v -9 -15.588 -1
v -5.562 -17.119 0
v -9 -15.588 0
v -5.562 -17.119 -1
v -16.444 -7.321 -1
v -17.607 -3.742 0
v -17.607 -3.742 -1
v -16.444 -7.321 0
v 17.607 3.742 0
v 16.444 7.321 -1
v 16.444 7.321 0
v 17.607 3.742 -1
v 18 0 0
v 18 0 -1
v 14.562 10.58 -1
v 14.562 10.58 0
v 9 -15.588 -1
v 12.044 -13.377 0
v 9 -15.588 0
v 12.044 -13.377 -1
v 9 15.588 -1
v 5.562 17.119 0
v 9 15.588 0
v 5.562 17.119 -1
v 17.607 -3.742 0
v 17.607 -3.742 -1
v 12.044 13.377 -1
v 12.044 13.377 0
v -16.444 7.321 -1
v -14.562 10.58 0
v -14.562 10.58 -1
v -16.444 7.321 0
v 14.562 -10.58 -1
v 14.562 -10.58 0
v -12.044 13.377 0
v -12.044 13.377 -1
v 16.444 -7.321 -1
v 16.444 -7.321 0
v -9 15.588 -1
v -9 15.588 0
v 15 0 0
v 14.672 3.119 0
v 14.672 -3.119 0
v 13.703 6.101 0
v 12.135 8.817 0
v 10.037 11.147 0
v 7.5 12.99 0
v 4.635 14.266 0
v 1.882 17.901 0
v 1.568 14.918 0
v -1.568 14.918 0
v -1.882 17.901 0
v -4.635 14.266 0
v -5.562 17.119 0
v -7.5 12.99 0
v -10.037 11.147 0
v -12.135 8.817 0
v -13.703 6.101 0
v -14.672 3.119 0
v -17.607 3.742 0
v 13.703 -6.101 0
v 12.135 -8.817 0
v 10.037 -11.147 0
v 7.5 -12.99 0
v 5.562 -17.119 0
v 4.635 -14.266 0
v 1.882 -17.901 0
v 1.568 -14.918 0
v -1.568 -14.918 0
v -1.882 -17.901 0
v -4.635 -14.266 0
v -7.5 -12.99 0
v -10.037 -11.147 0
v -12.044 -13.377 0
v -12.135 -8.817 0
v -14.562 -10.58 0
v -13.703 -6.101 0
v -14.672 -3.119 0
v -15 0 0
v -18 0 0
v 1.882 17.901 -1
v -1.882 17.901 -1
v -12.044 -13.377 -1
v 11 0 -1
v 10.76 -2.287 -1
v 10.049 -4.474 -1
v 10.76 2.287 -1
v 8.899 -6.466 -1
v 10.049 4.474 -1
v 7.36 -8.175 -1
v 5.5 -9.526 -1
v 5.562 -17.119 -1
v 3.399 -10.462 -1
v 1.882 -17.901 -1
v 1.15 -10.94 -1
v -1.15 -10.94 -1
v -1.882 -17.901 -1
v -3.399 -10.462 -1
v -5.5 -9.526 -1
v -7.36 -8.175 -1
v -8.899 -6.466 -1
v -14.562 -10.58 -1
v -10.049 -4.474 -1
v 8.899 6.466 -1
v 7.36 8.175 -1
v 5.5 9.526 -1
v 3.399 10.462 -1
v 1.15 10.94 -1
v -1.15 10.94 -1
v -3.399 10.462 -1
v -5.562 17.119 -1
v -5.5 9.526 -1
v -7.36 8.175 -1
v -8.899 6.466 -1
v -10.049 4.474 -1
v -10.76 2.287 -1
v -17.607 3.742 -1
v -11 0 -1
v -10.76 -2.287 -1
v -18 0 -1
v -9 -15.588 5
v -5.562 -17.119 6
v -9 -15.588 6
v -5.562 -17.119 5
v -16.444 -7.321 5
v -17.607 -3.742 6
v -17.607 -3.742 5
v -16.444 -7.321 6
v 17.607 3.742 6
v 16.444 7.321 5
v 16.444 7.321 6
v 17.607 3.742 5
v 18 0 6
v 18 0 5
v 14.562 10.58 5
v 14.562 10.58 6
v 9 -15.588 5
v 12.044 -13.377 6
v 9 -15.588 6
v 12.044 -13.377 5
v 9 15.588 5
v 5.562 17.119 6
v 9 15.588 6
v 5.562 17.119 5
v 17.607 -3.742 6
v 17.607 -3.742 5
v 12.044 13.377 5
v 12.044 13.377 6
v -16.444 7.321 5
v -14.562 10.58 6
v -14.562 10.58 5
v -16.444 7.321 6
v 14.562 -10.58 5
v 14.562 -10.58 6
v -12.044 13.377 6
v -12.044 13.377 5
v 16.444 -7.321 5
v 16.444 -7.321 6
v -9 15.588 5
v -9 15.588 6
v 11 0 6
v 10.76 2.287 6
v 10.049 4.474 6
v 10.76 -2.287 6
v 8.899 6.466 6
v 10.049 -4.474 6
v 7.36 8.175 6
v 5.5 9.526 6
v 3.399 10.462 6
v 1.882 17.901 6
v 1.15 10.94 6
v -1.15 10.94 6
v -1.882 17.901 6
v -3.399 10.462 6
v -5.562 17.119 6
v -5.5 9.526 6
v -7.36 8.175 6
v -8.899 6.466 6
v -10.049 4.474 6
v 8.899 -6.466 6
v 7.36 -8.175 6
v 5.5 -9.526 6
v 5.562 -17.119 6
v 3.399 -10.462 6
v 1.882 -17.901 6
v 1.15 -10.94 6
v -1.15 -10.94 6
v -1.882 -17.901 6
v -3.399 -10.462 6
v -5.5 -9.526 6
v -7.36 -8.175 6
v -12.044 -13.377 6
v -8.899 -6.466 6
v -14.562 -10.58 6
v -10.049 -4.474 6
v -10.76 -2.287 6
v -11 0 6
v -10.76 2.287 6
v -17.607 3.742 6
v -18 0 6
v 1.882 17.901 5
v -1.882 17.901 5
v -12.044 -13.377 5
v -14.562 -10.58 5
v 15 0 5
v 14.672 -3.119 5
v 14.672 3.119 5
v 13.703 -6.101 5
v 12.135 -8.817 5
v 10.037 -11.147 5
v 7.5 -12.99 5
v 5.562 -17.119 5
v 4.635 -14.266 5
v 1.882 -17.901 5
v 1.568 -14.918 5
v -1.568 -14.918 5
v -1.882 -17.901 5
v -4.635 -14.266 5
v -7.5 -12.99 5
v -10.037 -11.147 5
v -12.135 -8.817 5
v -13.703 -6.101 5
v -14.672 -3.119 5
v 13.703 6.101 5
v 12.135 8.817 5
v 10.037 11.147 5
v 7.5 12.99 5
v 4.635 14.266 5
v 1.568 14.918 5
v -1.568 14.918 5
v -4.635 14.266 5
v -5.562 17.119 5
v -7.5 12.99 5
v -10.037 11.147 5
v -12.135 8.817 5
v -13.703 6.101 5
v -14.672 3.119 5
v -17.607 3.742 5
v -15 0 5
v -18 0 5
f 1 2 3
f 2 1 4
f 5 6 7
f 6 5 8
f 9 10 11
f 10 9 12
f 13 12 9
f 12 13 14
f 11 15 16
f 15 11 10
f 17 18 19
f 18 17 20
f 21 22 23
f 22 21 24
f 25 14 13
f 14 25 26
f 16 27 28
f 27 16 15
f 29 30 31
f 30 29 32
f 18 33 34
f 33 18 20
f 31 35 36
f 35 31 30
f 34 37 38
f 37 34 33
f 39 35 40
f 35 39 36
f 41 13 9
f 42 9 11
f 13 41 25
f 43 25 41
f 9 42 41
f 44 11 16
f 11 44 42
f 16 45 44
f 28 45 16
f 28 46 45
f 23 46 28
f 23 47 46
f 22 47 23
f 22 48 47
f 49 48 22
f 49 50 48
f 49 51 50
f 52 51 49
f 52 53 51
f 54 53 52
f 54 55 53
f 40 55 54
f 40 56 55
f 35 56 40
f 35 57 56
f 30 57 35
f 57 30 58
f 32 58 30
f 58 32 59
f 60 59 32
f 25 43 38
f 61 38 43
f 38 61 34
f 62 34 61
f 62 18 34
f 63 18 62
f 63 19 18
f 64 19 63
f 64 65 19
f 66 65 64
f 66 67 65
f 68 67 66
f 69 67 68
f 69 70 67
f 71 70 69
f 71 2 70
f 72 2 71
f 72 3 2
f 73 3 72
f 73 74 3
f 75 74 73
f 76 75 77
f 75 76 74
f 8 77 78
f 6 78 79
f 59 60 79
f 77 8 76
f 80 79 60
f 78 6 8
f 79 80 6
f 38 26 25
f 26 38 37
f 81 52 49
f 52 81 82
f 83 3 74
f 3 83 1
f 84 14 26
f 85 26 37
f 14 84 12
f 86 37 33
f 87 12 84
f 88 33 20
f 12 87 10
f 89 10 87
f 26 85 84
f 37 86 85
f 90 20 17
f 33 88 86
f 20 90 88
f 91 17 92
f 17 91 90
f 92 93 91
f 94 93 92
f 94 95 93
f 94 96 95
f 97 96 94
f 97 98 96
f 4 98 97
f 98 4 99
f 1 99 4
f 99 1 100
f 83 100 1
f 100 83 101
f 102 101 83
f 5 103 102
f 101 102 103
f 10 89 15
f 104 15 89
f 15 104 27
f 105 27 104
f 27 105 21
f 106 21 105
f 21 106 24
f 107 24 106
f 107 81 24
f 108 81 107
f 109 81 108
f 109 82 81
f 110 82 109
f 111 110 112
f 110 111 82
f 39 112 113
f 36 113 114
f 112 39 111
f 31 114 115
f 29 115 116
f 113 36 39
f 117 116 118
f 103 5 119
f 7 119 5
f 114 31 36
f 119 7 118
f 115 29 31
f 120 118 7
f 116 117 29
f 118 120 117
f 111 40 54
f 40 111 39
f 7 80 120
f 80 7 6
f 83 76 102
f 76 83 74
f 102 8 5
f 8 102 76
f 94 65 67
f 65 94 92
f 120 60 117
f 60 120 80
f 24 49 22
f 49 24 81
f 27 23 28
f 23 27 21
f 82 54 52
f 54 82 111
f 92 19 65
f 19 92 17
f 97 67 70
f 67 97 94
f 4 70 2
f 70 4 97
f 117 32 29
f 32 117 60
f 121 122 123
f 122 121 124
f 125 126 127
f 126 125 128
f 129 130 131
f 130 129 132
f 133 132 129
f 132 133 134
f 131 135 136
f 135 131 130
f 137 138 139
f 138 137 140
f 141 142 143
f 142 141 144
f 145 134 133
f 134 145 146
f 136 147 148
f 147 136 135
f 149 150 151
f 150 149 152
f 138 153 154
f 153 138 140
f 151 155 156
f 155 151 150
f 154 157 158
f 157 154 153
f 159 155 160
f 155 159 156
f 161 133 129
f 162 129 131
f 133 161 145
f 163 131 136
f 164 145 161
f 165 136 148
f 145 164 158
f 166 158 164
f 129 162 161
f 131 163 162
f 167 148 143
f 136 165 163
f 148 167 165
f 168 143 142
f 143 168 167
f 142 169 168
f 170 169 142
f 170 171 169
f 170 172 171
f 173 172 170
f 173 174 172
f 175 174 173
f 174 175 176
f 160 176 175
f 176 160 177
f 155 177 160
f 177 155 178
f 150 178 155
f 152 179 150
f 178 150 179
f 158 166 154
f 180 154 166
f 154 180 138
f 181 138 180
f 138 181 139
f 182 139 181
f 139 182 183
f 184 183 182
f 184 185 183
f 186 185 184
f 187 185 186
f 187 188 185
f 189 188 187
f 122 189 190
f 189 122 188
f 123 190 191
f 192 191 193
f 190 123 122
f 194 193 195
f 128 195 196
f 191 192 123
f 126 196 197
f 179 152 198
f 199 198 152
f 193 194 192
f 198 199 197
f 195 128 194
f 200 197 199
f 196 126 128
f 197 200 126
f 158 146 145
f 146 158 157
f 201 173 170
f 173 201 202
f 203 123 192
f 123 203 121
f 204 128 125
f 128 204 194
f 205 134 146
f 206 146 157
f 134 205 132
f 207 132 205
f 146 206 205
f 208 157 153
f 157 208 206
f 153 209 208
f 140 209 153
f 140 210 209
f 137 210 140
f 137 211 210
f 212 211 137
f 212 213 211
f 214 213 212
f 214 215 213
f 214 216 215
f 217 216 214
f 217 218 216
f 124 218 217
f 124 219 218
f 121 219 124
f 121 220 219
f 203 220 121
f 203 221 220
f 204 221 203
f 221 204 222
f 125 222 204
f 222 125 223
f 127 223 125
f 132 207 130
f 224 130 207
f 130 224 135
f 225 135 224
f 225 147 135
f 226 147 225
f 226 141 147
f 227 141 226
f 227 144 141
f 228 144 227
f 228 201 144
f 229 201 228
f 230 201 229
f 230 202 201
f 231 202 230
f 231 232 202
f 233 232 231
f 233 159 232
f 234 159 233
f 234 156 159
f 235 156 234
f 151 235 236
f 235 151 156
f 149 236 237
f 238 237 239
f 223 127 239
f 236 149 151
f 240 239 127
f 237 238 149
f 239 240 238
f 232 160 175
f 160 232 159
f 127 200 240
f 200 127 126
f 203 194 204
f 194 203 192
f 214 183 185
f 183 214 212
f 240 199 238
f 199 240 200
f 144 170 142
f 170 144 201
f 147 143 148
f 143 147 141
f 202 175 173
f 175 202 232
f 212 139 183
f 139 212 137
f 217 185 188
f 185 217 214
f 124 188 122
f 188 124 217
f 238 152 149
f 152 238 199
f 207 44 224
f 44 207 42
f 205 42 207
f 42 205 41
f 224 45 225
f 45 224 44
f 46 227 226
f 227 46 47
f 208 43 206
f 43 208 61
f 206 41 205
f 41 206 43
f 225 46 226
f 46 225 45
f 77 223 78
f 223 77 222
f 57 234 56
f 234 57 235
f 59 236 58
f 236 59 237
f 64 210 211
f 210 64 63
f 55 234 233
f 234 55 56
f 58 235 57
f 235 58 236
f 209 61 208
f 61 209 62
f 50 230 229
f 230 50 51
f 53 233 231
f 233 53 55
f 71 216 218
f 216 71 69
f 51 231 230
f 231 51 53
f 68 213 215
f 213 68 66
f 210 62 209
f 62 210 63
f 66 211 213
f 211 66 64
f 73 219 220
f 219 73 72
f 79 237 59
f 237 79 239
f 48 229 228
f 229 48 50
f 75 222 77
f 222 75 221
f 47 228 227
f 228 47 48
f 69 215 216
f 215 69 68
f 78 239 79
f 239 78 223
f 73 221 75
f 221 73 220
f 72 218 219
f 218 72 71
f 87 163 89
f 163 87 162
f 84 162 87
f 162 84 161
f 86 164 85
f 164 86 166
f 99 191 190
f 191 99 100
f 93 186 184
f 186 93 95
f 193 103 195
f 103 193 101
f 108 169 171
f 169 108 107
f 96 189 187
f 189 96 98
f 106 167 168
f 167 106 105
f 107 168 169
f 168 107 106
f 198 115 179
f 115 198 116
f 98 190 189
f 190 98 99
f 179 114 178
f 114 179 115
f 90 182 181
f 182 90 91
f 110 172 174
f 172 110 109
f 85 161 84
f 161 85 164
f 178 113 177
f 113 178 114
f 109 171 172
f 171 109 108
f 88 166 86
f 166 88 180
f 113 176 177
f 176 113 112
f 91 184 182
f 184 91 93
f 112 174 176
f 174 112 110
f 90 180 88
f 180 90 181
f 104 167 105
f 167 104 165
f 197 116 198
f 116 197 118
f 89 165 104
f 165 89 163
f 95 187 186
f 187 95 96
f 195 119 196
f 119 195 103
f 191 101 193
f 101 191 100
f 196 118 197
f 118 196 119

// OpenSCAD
// [FL_INDEX: keywords="openscad, 3d_parametric, Wire_Coiler, csg_solid" | COT="Parametric OpenSCAD design from 3DCodeverse"]
// Title: Wire Coiler

// How big you want your coiler to be
cylinderRadius = 15;

module outer() {
	translate([0, 0, -1]) cylinder(r = cylinderRadius + 3, h = 1);
	translate([0, 0, 5]) cylinder(r = cylinderRadius + 3, h = 1);
}

module inner() {
	cylinder(r = cylinderRadius, h = 5);
}

difference() {
	union() {
		outer();
		inner();
	}
	translate([0, 0, -3]) cylinder(r = cylinderRadius - 4, h = 10);
}
